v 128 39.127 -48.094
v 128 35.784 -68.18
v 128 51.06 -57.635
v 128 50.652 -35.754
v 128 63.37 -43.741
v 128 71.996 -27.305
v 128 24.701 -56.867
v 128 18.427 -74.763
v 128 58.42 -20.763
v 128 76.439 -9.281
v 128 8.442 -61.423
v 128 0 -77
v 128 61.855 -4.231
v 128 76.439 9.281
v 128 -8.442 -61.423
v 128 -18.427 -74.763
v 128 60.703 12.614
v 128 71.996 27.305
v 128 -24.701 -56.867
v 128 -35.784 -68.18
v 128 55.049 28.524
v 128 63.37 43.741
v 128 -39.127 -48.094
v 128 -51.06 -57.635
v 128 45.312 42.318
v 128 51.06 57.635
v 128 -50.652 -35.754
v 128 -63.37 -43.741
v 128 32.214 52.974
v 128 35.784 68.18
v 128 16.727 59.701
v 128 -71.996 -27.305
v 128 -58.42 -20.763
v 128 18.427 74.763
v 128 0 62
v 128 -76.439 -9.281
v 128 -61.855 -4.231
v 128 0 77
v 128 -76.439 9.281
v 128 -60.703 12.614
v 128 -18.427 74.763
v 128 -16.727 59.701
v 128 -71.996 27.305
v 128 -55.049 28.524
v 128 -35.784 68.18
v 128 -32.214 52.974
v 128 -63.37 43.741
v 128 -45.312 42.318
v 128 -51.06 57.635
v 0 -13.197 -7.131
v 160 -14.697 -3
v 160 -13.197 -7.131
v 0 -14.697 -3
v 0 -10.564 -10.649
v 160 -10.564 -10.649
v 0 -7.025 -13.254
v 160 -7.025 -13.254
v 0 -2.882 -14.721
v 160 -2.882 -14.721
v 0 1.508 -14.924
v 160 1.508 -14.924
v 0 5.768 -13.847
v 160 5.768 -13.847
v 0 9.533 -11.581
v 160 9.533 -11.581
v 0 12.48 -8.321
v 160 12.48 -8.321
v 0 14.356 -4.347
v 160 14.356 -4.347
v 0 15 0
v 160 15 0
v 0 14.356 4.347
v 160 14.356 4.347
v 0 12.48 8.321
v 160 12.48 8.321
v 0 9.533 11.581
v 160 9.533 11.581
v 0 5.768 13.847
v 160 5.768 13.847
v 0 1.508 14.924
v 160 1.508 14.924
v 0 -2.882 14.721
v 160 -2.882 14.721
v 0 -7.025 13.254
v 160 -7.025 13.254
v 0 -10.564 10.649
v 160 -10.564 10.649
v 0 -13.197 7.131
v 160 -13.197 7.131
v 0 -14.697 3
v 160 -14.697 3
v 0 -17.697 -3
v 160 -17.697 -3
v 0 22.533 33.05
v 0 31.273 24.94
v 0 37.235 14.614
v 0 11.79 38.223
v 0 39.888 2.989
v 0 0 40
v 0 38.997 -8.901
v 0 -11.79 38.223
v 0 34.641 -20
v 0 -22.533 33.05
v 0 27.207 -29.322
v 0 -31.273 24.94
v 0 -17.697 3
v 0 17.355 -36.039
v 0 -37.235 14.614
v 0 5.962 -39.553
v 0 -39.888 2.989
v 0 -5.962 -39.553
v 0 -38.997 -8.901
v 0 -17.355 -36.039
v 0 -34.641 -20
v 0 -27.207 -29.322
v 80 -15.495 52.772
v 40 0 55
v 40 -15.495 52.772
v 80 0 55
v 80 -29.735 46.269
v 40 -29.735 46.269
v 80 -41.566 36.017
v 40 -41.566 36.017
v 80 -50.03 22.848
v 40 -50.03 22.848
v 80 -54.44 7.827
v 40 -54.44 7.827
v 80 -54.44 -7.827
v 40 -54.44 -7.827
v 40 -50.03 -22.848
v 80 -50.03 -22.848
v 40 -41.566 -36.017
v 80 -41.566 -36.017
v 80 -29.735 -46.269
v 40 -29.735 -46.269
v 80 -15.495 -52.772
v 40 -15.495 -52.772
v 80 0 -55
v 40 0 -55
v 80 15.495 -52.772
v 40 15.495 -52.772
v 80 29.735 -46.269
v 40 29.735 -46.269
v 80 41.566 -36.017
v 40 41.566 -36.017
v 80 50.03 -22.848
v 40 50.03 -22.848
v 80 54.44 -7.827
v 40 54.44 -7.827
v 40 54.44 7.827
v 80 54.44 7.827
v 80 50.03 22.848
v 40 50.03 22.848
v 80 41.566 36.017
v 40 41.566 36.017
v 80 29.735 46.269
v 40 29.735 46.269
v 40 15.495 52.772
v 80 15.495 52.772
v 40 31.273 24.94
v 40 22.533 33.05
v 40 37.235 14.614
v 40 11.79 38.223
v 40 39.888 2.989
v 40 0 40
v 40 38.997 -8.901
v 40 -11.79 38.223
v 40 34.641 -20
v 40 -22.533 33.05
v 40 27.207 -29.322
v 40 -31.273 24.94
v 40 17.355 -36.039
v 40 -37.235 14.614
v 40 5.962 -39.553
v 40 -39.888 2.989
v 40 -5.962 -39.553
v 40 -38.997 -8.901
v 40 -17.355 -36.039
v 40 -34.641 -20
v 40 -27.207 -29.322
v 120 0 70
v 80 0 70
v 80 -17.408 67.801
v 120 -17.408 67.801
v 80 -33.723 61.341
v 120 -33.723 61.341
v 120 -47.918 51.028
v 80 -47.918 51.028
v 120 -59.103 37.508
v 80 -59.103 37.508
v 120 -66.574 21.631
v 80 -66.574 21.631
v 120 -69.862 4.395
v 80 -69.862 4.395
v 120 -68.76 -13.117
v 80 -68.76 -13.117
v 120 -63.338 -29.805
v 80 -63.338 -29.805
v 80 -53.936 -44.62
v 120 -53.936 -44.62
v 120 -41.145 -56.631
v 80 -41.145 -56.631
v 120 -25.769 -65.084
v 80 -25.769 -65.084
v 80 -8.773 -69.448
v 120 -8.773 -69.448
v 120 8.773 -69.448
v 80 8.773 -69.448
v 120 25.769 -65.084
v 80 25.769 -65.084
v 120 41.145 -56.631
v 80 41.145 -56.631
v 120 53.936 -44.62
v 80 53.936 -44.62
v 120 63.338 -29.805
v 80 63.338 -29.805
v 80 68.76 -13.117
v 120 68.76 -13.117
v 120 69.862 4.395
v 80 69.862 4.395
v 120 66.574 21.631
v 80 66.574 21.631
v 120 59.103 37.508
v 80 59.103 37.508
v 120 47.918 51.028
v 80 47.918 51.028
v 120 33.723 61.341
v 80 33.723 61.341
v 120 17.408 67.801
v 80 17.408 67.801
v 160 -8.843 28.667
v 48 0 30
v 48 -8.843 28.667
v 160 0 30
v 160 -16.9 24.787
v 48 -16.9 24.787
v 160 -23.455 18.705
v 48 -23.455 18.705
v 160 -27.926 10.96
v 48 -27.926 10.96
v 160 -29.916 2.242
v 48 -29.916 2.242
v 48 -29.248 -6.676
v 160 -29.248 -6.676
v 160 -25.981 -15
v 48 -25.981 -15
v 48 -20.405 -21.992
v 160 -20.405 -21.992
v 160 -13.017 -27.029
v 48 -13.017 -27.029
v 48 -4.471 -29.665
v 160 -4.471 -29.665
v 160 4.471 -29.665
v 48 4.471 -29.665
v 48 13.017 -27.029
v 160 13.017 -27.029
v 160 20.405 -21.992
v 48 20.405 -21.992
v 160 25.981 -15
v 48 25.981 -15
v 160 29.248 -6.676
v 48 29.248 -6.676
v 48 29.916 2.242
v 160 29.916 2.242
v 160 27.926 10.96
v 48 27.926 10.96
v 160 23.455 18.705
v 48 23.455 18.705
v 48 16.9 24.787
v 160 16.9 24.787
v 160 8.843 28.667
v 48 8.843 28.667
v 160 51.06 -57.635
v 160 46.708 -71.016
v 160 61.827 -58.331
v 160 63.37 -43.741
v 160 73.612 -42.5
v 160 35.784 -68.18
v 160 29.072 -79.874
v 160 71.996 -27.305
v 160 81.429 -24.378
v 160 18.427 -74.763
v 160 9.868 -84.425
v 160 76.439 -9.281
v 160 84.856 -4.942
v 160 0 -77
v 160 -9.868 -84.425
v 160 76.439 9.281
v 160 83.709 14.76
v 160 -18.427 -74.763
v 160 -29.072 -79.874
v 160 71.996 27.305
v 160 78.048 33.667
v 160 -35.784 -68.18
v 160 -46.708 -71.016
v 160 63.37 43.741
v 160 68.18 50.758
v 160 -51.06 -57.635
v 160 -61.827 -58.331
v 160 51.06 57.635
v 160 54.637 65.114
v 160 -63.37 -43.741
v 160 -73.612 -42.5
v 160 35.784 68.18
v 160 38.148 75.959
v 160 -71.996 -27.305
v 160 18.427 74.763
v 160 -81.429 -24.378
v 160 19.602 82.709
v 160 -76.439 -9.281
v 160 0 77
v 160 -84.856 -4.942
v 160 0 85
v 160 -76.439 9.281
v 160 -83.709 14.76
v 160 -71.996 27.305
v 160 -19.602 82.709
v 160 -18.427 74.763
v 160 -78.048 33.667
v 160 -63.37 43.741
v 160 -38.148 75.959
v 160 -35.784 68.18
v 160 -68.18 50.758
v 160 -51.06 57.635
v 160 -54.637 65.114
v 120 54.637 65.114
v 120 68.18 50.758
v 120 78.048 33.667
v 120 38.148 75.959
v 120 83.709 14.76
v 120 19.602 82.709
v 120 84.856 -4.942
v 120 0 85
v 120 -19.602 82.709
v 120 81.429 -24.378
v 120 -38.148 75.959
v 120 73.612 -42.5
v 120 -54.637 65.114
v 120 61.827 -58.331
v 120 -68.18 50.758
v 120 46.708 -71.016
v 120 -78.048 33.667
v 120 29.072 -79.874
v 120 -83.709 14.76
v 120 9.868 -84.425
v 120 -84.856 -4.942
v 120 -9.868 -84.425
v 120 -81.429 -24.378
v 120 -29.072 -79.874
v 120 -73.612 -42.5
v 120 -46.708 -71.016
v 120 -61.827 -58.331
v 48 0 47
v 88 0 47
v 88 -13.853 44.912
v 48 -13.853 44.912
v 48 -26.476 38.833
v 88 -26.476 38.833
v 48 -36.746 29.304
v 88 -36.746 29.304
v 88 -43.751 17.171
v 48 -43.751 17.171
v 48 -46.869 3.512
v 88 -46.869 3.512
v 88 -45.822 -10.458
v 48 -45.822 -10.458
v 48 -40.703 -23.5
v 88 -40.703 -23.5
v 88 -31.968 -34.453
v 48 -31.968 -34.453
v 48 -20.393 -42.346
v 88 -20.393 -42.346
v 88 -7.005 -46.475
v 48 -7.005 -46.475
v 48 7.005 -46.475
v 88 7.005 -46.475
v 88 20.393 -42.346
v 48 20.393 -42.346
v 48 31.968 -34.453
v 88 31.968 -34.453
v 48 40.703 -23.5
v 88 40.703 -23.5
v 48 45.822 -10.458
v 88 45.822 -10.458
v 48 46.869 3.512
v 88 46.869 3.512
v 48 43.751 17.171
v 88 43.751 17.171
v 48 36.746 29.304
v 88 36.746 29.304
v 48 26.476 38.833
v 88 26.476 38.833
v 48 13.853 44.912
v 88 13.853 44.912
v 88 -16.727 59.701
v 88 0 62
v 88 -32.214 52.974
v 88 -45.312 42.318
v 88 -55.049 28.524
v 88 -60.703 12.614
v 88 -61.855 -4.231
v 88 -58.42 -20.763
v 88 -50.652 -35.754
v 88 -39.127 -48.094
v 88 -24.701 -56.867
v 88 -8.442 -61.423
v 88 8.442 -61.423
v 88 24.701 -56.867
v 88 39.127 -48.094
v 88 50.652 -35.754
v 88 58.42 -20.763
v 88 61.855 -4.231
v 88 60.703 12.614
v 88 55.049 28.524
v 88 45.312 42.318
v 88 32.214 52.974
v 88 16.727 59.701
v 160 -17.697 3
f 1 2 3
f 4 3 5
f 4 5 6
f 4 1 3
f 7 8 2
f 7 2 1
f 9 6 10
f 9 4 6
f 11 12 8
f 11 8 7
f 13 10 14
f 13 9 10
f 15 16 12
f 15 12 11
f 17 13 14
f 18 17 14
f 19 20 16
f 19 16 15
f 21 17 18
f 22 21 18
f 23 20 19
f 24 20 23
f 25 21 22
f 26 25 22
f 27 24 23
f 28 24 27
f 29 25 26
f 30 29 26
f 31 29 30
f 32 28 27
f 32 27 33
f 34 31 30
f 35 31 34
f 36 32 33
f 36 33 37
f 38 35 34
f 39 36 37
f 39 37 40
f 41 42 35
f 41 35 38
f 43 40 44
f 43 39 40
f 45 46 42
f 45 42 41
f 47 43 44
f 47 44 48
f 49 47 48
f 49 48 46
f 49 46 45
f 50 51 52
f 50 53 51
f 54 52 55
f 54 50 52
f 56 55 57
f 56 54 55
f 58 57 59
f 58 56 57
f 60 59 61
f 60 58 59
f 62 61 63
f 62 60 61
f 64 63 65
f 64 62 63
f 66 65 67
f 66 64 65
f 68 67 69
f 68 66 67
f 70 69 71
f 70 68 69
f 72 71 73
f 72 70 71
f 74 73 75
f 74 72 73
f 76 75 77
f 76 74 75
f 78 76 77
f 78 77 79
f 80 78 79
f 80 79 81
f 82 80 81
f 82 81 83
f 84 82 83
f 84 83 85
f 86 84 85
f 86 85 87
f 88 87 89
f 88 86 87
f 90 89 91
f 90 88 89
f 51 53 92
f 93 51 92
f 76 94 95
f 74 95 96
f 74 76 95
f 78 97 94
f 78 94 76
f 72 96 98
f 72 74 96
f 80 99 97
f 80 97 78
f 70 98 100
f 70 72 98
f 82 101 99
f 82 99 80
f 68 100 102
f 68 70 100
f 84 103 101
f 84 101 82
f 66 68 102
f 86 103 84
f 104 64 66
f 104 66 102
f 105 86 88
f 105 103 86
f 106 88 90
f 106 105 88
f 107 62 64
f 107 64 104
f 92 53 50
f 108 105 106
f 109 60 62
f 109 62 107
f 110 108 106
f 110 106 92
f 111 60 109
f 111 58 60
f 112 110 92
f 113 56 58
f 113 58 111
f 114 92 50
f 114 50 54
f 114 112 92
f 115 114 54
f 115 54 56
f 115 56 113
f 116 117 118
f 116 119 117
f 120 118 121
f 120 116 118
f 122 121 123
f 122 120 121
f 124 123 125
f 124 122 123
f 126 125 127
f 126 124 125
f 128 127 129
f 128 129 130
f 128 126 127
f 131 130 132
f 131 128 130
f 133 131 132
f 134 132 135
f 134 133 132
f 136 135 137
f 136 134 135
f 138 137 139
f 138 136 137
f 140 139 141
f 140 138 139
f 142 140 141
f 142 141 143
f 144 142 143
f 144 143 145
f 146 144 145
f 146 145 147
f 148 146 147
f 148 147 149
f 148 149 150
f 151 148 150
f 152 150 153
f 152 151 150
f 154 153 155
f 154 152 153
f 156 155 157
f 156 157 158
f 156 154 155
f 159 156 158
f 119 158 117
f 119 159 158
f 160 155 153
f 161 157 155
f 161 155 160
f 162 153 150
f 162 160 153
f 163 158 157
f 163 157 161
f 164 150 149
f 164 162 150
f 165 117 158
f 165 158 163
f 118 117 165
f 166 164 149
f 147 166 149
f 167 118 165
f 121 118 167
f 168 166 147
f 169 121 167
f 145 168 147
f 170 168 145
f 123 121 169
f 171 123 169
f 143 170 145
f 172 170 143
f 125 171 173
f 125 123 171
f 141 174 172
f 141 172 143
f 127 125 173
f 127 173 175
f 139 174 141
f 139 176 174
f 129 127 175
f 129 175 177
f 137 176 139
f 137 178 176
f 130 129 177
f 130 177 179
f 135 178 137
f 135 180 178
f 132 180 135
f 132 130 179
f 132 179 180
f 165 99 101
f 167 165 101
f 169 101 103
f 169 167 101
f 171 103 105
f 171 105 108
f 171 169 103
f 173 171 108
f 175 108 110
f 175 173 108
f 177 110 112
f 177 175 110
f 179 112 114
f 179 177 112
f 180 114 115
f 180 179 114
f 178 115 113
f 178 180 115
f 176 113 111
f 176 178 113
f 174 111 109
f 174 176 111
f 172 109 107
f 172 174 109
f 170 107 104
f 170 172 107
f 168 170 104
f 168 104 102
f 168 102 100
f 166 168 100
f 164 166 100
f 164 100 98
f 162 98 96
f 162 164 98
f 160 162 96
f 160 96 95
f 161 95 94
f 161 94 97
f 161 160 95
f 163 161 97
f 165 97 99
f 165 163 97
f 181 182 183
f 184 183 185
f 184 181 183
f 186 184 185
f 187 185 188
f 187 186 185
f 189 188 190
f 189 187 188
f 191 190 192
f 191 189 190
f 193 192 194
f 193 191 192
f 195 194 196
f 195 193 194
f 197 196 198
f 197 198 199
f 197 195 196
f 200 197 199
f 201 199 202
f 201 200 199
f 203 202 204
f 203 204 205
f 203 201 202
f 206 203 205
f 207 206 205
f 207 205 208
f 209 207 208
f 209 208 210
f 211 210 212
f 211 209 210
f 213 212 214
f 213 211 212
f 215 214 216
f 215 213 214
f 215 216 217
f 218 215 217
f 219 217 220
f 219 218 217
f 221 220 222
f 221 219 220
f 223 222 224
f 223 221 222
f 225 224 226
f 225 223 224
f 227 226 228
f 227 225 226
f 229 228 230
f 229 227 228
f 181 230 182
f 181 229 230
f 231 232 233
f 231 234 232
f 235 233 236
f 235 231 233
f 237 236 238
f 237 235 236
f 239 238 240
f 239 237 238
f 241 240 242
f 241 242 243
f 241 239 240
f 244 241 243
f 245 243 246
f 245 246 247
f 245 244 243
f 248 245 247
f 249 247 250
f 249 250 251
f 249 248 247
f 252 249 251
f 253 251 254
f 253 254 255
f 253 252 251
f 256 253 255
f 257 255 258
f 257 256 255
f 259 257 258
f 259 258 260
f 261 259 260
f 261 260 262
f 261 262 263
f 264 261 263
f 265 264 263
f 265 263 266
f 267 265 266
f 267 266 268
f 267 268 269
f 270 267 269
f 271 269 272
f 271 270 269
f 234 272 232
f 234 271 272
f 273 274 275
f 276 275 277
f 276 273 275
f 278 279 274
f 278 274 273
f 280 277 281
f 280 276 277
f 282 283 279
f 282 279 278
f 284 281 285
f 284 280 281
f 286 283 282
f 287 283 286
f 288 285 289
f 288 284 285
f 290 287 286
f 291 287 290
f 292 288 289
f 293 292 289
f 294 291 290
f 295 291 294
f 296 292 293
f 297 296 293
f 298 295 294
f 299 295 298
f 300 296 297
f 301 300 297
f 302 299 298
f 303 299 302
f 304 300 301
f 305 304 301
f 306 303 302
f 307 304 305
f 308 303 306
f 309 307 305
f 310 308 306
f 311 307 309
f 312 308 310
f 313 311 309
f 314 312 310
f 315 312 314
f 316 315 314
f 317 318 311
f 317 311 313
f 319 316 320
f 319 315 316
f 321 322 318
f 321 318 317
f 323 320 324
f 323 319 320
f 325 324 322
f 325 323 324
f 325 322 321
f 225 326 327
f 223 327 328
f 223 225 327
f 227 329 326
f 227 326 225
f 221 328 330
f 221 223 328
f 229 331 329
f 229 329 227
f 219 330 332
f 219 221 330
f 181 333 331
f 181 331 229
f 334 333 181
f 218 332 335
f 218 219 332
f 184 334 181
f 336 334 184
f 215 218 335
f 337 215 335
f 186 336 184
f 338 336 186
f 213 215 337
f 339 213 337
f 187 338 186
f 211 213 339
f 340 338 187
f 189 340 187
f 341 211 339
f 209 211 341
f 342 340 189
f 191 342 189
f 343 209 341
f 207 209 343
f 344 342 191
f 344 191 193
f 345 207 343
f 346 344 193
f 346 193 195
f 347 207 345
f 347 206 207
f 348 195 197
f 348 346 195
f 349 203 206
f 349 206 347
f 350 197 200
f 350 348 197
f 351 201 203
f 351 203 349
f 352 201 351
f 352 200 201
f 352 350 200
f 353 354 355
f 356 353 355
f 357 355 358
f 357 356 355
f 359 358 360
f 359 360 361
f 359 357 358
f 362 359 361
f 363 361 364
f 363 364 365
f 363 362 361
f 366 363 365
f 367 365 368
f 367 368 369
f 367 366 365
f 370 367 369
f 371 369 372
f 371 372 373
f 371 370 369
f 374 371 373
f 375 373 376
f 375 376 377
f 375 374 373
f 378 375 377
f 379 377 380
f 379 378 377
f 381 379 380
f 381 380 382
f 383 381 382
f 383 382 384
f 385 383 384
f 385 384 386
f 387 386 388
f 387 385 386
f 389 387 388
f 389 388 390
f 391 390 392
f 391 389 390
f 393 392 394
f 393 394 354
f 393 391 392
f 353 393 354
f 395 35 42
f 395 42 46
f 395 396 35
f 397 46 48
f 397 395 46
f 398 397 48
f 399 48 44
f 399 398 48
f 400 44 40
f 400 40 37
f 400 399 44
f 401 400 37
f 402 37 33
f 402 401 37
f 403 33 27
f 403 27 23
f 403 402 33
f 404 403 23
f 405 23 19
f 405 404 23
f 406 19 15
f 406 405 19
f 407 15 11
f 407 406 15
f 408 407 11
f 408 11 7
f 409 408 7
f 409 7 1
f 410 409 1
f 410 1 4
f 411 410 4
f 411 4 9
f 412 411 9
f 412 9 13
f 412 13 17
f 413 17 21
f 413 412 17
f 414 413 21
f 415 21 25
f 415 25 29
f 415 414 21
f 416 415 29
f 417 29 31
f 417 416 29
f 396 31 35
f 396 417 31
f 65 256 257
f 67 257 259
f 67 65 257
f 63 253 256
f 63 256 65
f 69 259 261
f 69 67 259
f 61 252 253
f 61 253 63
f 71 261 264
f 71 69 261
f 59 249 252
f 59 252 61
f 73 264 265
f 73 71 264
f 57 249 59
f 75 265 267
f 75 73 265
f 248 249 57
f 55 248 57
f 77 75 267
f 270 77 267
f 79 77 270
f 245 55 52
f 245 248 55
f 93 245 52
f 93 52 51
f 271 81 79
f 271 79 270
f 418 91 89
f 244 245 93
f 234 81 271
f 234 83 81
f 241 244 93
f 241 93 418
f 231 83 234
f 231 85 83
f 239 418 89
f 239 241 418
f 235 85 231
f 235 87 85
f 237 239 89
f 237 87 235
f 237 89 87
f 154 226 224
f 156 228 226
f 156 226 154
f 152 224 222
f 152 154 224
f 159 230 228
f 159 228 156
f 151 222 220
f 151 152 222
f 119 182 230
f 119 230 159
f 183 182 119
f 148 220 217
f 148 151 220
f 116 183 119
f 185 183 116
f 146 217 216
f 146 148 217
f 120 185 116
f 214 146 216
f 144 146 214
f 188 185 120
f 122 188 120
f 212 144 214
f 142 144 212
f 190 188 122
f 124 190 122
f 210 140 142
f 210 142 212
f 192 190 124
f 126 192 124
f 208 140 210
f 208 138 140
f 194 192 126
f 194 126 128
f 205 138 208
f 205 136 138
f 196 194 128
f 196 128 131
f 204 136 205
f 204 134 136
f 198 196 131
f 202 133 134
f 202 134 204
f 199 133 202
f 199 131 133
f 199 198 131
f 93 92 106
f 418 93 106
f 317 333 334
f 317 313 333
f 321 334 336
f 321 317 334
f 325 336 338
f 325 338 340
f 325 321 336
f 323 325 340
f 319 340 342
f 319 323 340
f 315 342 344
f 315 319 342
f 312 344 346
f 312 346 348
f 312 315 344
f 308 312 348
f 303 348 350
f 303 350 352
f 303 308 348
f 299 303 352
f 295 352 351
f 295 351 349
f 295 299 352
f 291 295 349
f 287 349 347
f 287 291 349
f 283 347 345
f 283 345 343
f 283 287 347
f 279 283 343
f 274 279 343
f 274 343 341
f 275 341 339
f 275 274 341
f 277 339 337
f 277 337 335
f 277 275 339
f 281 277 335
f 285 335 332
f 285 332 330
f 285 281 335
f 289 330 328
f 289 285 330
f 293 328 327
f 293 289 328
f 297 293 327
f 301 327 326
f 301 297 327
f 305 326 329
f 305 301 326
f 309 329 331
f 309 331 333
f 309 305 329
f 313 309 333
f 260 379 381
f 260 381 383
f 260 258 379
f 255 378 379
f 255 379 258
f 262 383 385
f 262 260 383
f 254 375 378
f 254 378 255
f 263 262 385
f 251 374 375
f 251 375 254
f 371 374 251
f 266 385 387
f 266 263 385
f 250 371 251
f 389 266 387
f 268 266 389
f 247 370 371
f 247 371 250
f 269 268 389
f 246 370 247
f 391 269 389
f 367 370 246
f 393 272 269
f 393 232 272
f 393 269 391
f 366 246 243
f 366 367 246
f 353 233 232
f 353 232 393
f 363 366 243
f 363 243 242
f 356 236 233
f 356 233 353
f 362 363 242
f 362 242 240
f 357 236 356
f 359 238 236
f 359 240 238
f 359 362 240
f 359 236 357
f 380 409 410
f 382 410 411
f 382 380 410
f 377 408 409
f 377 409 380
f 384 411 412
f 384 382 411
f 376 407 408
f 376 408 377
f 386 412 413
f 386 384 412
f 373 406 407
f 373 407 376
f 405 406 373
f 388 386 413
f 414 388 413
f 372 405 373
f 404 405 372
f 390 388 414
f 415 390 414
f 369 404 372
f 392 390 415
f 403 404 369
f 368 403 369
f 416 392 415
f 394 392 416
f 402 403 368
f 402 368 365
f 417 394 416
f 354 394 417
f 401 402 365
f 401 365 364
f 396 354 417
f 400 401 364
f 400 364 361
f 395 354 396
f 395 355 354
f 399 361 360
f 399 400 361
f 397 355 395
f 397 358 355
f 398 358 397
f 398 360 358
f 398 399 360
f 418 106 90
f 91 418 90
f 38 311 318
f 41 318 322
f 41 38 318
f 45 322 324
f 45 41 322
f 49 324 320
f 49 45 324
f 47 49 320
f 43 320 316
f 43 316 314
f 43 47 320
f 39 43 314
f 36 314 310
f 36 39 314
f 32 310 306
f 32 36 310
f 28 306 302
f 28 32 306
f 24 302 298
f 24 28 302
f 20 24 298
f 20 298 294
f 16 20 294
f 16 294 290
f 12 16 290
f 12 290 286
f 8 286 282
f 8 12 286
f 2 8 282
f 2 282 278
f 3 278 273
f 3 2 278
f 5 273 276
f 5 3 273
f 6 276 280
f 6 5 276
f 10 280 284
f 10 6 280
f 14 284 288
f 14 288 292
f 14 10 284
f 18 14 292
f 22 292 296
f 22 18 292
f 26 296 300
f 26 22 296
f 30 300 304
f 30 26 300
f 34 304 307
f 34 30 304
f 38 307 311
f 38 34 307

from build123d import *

# Parameters (mm, degrees)
CUT_EXTRUDE1_REACH = 202.125


with BuildPart() as part:
    # Sketch1 → Revolve1 (revolve)
    with BuildSketch(Plane(origin=(0, 0, 0), x_dir=(1, 0, 0), z_dir=(0, 1, 0)), mode=Mode.PRIVATE) as revolve1_sk:
        Polygon((0, 15), (0, 40), (40, 40), (40, 55), (80, 55), (80, 70), (120, 70), (120, 85), (160, 85), (160, 77), (128, 77), (128, 62), (88, 62), (88, 47), (48, 47), (48, 30), (160, 30), (160, 15), align=None)
    revolve(revolve1_sk.sketch.rotate(Axis((-116.687976722, 0, 0), (1, 0, 0)), 180), axis=Axis((-116.687976722, 0, 0), (1, 0, 0)))

    # Sketch2 → Cut-Extrude1 (cut, up to next)
    with BuildSketch(Plane.ZY, mode=Mode.PRIVATE) as cut_extrude1_sk1:
        with BuildLine():
            Line((-3, -14.696938457), (-3, -17.696938457))
            Line((-3, -17.696938457), (3, -17.696938457))
            Line((3, -17.696938457), (3, -14.696938457))
            ThreePointArc((3, -14.696938457), (0, -15), (-3, -14.696938457))
        make_face()
    cut_extrude1_tool1 = extrude(cut_extrude1_sk1.sketch, amount=-CUT_EXTRUDE1_REACH, mode=Mode.PRIVATE) & part.part
    add(cut_extrude1_tool1.solids().sort_by_distance((0, -16.29671, 0))[0], mode=Mode.SUBTRACT)


solid = part.part
